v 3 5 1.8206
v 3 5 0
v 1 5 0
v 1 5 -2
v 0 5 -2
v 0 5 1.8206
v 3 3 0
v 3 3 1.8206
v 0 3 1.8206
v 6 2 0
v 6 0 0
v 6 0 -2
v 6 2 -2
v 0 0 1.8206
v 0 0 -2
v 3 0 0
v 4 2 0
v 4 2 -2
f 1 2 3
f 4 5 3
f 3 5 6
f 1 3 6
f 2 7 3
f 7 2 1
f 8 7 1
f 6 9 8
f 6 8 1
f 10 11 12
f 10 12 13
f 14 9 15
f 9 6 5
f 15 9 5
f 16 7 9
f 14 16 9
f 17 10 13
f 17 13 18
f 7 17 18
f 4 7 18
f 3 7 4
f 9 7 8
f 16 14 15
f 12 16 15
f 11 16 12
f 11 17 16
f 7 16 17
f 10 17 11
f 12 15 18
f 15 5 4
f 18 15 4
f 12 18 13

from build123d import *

# Parameters (mm, degrees)
BOSS_EXTRUDE1_DEPTH = 2
SKETCH2_W           = 1.82062343
SKETCH2_H           = 2
BOSS_EXTRUDE2_DEPTH = 3
BOSS_EXTRUDE3_DEPTH = 3


with BuildPart() as part:
    # Sketch1 → Boss-Extrude1 (new body)
    with BuildSketch(Plane.XY):
        Polygon((0, 0), (6, 0), (6, 2), (4, 2), (1, 5), (0, 5), align=None)
    extrude(amount=-BOSS_EXTRUDE1_DEPTH)



with BuildPart() as body_2:
    # Sketch2 → Boss-Extrude2 (new body)
    with BuildSketch(Plane.ZY):
        with Locations((0.910311715, 4)):
            Rectangle(SKETCH2_W, SKETCH2_H)
    extrude(amount=-BOSS_EXTRUDE2_DEPTH)


with BuildPart() as part_1:
    add(part.part)

    add(body_2.part)  # Boss-Extrude3 merges body 2
    # Sketch3 → Boss-Extrude3 (add)
    with BuildSketch(Plane.XZ.offset(-3)):
        Polygon((0, 0), (3, 0), (0, 1.82062343), align=None)
    extrude(amount=BOSS_EXTRUDE3_DEPTH)


solid = part_1.part
